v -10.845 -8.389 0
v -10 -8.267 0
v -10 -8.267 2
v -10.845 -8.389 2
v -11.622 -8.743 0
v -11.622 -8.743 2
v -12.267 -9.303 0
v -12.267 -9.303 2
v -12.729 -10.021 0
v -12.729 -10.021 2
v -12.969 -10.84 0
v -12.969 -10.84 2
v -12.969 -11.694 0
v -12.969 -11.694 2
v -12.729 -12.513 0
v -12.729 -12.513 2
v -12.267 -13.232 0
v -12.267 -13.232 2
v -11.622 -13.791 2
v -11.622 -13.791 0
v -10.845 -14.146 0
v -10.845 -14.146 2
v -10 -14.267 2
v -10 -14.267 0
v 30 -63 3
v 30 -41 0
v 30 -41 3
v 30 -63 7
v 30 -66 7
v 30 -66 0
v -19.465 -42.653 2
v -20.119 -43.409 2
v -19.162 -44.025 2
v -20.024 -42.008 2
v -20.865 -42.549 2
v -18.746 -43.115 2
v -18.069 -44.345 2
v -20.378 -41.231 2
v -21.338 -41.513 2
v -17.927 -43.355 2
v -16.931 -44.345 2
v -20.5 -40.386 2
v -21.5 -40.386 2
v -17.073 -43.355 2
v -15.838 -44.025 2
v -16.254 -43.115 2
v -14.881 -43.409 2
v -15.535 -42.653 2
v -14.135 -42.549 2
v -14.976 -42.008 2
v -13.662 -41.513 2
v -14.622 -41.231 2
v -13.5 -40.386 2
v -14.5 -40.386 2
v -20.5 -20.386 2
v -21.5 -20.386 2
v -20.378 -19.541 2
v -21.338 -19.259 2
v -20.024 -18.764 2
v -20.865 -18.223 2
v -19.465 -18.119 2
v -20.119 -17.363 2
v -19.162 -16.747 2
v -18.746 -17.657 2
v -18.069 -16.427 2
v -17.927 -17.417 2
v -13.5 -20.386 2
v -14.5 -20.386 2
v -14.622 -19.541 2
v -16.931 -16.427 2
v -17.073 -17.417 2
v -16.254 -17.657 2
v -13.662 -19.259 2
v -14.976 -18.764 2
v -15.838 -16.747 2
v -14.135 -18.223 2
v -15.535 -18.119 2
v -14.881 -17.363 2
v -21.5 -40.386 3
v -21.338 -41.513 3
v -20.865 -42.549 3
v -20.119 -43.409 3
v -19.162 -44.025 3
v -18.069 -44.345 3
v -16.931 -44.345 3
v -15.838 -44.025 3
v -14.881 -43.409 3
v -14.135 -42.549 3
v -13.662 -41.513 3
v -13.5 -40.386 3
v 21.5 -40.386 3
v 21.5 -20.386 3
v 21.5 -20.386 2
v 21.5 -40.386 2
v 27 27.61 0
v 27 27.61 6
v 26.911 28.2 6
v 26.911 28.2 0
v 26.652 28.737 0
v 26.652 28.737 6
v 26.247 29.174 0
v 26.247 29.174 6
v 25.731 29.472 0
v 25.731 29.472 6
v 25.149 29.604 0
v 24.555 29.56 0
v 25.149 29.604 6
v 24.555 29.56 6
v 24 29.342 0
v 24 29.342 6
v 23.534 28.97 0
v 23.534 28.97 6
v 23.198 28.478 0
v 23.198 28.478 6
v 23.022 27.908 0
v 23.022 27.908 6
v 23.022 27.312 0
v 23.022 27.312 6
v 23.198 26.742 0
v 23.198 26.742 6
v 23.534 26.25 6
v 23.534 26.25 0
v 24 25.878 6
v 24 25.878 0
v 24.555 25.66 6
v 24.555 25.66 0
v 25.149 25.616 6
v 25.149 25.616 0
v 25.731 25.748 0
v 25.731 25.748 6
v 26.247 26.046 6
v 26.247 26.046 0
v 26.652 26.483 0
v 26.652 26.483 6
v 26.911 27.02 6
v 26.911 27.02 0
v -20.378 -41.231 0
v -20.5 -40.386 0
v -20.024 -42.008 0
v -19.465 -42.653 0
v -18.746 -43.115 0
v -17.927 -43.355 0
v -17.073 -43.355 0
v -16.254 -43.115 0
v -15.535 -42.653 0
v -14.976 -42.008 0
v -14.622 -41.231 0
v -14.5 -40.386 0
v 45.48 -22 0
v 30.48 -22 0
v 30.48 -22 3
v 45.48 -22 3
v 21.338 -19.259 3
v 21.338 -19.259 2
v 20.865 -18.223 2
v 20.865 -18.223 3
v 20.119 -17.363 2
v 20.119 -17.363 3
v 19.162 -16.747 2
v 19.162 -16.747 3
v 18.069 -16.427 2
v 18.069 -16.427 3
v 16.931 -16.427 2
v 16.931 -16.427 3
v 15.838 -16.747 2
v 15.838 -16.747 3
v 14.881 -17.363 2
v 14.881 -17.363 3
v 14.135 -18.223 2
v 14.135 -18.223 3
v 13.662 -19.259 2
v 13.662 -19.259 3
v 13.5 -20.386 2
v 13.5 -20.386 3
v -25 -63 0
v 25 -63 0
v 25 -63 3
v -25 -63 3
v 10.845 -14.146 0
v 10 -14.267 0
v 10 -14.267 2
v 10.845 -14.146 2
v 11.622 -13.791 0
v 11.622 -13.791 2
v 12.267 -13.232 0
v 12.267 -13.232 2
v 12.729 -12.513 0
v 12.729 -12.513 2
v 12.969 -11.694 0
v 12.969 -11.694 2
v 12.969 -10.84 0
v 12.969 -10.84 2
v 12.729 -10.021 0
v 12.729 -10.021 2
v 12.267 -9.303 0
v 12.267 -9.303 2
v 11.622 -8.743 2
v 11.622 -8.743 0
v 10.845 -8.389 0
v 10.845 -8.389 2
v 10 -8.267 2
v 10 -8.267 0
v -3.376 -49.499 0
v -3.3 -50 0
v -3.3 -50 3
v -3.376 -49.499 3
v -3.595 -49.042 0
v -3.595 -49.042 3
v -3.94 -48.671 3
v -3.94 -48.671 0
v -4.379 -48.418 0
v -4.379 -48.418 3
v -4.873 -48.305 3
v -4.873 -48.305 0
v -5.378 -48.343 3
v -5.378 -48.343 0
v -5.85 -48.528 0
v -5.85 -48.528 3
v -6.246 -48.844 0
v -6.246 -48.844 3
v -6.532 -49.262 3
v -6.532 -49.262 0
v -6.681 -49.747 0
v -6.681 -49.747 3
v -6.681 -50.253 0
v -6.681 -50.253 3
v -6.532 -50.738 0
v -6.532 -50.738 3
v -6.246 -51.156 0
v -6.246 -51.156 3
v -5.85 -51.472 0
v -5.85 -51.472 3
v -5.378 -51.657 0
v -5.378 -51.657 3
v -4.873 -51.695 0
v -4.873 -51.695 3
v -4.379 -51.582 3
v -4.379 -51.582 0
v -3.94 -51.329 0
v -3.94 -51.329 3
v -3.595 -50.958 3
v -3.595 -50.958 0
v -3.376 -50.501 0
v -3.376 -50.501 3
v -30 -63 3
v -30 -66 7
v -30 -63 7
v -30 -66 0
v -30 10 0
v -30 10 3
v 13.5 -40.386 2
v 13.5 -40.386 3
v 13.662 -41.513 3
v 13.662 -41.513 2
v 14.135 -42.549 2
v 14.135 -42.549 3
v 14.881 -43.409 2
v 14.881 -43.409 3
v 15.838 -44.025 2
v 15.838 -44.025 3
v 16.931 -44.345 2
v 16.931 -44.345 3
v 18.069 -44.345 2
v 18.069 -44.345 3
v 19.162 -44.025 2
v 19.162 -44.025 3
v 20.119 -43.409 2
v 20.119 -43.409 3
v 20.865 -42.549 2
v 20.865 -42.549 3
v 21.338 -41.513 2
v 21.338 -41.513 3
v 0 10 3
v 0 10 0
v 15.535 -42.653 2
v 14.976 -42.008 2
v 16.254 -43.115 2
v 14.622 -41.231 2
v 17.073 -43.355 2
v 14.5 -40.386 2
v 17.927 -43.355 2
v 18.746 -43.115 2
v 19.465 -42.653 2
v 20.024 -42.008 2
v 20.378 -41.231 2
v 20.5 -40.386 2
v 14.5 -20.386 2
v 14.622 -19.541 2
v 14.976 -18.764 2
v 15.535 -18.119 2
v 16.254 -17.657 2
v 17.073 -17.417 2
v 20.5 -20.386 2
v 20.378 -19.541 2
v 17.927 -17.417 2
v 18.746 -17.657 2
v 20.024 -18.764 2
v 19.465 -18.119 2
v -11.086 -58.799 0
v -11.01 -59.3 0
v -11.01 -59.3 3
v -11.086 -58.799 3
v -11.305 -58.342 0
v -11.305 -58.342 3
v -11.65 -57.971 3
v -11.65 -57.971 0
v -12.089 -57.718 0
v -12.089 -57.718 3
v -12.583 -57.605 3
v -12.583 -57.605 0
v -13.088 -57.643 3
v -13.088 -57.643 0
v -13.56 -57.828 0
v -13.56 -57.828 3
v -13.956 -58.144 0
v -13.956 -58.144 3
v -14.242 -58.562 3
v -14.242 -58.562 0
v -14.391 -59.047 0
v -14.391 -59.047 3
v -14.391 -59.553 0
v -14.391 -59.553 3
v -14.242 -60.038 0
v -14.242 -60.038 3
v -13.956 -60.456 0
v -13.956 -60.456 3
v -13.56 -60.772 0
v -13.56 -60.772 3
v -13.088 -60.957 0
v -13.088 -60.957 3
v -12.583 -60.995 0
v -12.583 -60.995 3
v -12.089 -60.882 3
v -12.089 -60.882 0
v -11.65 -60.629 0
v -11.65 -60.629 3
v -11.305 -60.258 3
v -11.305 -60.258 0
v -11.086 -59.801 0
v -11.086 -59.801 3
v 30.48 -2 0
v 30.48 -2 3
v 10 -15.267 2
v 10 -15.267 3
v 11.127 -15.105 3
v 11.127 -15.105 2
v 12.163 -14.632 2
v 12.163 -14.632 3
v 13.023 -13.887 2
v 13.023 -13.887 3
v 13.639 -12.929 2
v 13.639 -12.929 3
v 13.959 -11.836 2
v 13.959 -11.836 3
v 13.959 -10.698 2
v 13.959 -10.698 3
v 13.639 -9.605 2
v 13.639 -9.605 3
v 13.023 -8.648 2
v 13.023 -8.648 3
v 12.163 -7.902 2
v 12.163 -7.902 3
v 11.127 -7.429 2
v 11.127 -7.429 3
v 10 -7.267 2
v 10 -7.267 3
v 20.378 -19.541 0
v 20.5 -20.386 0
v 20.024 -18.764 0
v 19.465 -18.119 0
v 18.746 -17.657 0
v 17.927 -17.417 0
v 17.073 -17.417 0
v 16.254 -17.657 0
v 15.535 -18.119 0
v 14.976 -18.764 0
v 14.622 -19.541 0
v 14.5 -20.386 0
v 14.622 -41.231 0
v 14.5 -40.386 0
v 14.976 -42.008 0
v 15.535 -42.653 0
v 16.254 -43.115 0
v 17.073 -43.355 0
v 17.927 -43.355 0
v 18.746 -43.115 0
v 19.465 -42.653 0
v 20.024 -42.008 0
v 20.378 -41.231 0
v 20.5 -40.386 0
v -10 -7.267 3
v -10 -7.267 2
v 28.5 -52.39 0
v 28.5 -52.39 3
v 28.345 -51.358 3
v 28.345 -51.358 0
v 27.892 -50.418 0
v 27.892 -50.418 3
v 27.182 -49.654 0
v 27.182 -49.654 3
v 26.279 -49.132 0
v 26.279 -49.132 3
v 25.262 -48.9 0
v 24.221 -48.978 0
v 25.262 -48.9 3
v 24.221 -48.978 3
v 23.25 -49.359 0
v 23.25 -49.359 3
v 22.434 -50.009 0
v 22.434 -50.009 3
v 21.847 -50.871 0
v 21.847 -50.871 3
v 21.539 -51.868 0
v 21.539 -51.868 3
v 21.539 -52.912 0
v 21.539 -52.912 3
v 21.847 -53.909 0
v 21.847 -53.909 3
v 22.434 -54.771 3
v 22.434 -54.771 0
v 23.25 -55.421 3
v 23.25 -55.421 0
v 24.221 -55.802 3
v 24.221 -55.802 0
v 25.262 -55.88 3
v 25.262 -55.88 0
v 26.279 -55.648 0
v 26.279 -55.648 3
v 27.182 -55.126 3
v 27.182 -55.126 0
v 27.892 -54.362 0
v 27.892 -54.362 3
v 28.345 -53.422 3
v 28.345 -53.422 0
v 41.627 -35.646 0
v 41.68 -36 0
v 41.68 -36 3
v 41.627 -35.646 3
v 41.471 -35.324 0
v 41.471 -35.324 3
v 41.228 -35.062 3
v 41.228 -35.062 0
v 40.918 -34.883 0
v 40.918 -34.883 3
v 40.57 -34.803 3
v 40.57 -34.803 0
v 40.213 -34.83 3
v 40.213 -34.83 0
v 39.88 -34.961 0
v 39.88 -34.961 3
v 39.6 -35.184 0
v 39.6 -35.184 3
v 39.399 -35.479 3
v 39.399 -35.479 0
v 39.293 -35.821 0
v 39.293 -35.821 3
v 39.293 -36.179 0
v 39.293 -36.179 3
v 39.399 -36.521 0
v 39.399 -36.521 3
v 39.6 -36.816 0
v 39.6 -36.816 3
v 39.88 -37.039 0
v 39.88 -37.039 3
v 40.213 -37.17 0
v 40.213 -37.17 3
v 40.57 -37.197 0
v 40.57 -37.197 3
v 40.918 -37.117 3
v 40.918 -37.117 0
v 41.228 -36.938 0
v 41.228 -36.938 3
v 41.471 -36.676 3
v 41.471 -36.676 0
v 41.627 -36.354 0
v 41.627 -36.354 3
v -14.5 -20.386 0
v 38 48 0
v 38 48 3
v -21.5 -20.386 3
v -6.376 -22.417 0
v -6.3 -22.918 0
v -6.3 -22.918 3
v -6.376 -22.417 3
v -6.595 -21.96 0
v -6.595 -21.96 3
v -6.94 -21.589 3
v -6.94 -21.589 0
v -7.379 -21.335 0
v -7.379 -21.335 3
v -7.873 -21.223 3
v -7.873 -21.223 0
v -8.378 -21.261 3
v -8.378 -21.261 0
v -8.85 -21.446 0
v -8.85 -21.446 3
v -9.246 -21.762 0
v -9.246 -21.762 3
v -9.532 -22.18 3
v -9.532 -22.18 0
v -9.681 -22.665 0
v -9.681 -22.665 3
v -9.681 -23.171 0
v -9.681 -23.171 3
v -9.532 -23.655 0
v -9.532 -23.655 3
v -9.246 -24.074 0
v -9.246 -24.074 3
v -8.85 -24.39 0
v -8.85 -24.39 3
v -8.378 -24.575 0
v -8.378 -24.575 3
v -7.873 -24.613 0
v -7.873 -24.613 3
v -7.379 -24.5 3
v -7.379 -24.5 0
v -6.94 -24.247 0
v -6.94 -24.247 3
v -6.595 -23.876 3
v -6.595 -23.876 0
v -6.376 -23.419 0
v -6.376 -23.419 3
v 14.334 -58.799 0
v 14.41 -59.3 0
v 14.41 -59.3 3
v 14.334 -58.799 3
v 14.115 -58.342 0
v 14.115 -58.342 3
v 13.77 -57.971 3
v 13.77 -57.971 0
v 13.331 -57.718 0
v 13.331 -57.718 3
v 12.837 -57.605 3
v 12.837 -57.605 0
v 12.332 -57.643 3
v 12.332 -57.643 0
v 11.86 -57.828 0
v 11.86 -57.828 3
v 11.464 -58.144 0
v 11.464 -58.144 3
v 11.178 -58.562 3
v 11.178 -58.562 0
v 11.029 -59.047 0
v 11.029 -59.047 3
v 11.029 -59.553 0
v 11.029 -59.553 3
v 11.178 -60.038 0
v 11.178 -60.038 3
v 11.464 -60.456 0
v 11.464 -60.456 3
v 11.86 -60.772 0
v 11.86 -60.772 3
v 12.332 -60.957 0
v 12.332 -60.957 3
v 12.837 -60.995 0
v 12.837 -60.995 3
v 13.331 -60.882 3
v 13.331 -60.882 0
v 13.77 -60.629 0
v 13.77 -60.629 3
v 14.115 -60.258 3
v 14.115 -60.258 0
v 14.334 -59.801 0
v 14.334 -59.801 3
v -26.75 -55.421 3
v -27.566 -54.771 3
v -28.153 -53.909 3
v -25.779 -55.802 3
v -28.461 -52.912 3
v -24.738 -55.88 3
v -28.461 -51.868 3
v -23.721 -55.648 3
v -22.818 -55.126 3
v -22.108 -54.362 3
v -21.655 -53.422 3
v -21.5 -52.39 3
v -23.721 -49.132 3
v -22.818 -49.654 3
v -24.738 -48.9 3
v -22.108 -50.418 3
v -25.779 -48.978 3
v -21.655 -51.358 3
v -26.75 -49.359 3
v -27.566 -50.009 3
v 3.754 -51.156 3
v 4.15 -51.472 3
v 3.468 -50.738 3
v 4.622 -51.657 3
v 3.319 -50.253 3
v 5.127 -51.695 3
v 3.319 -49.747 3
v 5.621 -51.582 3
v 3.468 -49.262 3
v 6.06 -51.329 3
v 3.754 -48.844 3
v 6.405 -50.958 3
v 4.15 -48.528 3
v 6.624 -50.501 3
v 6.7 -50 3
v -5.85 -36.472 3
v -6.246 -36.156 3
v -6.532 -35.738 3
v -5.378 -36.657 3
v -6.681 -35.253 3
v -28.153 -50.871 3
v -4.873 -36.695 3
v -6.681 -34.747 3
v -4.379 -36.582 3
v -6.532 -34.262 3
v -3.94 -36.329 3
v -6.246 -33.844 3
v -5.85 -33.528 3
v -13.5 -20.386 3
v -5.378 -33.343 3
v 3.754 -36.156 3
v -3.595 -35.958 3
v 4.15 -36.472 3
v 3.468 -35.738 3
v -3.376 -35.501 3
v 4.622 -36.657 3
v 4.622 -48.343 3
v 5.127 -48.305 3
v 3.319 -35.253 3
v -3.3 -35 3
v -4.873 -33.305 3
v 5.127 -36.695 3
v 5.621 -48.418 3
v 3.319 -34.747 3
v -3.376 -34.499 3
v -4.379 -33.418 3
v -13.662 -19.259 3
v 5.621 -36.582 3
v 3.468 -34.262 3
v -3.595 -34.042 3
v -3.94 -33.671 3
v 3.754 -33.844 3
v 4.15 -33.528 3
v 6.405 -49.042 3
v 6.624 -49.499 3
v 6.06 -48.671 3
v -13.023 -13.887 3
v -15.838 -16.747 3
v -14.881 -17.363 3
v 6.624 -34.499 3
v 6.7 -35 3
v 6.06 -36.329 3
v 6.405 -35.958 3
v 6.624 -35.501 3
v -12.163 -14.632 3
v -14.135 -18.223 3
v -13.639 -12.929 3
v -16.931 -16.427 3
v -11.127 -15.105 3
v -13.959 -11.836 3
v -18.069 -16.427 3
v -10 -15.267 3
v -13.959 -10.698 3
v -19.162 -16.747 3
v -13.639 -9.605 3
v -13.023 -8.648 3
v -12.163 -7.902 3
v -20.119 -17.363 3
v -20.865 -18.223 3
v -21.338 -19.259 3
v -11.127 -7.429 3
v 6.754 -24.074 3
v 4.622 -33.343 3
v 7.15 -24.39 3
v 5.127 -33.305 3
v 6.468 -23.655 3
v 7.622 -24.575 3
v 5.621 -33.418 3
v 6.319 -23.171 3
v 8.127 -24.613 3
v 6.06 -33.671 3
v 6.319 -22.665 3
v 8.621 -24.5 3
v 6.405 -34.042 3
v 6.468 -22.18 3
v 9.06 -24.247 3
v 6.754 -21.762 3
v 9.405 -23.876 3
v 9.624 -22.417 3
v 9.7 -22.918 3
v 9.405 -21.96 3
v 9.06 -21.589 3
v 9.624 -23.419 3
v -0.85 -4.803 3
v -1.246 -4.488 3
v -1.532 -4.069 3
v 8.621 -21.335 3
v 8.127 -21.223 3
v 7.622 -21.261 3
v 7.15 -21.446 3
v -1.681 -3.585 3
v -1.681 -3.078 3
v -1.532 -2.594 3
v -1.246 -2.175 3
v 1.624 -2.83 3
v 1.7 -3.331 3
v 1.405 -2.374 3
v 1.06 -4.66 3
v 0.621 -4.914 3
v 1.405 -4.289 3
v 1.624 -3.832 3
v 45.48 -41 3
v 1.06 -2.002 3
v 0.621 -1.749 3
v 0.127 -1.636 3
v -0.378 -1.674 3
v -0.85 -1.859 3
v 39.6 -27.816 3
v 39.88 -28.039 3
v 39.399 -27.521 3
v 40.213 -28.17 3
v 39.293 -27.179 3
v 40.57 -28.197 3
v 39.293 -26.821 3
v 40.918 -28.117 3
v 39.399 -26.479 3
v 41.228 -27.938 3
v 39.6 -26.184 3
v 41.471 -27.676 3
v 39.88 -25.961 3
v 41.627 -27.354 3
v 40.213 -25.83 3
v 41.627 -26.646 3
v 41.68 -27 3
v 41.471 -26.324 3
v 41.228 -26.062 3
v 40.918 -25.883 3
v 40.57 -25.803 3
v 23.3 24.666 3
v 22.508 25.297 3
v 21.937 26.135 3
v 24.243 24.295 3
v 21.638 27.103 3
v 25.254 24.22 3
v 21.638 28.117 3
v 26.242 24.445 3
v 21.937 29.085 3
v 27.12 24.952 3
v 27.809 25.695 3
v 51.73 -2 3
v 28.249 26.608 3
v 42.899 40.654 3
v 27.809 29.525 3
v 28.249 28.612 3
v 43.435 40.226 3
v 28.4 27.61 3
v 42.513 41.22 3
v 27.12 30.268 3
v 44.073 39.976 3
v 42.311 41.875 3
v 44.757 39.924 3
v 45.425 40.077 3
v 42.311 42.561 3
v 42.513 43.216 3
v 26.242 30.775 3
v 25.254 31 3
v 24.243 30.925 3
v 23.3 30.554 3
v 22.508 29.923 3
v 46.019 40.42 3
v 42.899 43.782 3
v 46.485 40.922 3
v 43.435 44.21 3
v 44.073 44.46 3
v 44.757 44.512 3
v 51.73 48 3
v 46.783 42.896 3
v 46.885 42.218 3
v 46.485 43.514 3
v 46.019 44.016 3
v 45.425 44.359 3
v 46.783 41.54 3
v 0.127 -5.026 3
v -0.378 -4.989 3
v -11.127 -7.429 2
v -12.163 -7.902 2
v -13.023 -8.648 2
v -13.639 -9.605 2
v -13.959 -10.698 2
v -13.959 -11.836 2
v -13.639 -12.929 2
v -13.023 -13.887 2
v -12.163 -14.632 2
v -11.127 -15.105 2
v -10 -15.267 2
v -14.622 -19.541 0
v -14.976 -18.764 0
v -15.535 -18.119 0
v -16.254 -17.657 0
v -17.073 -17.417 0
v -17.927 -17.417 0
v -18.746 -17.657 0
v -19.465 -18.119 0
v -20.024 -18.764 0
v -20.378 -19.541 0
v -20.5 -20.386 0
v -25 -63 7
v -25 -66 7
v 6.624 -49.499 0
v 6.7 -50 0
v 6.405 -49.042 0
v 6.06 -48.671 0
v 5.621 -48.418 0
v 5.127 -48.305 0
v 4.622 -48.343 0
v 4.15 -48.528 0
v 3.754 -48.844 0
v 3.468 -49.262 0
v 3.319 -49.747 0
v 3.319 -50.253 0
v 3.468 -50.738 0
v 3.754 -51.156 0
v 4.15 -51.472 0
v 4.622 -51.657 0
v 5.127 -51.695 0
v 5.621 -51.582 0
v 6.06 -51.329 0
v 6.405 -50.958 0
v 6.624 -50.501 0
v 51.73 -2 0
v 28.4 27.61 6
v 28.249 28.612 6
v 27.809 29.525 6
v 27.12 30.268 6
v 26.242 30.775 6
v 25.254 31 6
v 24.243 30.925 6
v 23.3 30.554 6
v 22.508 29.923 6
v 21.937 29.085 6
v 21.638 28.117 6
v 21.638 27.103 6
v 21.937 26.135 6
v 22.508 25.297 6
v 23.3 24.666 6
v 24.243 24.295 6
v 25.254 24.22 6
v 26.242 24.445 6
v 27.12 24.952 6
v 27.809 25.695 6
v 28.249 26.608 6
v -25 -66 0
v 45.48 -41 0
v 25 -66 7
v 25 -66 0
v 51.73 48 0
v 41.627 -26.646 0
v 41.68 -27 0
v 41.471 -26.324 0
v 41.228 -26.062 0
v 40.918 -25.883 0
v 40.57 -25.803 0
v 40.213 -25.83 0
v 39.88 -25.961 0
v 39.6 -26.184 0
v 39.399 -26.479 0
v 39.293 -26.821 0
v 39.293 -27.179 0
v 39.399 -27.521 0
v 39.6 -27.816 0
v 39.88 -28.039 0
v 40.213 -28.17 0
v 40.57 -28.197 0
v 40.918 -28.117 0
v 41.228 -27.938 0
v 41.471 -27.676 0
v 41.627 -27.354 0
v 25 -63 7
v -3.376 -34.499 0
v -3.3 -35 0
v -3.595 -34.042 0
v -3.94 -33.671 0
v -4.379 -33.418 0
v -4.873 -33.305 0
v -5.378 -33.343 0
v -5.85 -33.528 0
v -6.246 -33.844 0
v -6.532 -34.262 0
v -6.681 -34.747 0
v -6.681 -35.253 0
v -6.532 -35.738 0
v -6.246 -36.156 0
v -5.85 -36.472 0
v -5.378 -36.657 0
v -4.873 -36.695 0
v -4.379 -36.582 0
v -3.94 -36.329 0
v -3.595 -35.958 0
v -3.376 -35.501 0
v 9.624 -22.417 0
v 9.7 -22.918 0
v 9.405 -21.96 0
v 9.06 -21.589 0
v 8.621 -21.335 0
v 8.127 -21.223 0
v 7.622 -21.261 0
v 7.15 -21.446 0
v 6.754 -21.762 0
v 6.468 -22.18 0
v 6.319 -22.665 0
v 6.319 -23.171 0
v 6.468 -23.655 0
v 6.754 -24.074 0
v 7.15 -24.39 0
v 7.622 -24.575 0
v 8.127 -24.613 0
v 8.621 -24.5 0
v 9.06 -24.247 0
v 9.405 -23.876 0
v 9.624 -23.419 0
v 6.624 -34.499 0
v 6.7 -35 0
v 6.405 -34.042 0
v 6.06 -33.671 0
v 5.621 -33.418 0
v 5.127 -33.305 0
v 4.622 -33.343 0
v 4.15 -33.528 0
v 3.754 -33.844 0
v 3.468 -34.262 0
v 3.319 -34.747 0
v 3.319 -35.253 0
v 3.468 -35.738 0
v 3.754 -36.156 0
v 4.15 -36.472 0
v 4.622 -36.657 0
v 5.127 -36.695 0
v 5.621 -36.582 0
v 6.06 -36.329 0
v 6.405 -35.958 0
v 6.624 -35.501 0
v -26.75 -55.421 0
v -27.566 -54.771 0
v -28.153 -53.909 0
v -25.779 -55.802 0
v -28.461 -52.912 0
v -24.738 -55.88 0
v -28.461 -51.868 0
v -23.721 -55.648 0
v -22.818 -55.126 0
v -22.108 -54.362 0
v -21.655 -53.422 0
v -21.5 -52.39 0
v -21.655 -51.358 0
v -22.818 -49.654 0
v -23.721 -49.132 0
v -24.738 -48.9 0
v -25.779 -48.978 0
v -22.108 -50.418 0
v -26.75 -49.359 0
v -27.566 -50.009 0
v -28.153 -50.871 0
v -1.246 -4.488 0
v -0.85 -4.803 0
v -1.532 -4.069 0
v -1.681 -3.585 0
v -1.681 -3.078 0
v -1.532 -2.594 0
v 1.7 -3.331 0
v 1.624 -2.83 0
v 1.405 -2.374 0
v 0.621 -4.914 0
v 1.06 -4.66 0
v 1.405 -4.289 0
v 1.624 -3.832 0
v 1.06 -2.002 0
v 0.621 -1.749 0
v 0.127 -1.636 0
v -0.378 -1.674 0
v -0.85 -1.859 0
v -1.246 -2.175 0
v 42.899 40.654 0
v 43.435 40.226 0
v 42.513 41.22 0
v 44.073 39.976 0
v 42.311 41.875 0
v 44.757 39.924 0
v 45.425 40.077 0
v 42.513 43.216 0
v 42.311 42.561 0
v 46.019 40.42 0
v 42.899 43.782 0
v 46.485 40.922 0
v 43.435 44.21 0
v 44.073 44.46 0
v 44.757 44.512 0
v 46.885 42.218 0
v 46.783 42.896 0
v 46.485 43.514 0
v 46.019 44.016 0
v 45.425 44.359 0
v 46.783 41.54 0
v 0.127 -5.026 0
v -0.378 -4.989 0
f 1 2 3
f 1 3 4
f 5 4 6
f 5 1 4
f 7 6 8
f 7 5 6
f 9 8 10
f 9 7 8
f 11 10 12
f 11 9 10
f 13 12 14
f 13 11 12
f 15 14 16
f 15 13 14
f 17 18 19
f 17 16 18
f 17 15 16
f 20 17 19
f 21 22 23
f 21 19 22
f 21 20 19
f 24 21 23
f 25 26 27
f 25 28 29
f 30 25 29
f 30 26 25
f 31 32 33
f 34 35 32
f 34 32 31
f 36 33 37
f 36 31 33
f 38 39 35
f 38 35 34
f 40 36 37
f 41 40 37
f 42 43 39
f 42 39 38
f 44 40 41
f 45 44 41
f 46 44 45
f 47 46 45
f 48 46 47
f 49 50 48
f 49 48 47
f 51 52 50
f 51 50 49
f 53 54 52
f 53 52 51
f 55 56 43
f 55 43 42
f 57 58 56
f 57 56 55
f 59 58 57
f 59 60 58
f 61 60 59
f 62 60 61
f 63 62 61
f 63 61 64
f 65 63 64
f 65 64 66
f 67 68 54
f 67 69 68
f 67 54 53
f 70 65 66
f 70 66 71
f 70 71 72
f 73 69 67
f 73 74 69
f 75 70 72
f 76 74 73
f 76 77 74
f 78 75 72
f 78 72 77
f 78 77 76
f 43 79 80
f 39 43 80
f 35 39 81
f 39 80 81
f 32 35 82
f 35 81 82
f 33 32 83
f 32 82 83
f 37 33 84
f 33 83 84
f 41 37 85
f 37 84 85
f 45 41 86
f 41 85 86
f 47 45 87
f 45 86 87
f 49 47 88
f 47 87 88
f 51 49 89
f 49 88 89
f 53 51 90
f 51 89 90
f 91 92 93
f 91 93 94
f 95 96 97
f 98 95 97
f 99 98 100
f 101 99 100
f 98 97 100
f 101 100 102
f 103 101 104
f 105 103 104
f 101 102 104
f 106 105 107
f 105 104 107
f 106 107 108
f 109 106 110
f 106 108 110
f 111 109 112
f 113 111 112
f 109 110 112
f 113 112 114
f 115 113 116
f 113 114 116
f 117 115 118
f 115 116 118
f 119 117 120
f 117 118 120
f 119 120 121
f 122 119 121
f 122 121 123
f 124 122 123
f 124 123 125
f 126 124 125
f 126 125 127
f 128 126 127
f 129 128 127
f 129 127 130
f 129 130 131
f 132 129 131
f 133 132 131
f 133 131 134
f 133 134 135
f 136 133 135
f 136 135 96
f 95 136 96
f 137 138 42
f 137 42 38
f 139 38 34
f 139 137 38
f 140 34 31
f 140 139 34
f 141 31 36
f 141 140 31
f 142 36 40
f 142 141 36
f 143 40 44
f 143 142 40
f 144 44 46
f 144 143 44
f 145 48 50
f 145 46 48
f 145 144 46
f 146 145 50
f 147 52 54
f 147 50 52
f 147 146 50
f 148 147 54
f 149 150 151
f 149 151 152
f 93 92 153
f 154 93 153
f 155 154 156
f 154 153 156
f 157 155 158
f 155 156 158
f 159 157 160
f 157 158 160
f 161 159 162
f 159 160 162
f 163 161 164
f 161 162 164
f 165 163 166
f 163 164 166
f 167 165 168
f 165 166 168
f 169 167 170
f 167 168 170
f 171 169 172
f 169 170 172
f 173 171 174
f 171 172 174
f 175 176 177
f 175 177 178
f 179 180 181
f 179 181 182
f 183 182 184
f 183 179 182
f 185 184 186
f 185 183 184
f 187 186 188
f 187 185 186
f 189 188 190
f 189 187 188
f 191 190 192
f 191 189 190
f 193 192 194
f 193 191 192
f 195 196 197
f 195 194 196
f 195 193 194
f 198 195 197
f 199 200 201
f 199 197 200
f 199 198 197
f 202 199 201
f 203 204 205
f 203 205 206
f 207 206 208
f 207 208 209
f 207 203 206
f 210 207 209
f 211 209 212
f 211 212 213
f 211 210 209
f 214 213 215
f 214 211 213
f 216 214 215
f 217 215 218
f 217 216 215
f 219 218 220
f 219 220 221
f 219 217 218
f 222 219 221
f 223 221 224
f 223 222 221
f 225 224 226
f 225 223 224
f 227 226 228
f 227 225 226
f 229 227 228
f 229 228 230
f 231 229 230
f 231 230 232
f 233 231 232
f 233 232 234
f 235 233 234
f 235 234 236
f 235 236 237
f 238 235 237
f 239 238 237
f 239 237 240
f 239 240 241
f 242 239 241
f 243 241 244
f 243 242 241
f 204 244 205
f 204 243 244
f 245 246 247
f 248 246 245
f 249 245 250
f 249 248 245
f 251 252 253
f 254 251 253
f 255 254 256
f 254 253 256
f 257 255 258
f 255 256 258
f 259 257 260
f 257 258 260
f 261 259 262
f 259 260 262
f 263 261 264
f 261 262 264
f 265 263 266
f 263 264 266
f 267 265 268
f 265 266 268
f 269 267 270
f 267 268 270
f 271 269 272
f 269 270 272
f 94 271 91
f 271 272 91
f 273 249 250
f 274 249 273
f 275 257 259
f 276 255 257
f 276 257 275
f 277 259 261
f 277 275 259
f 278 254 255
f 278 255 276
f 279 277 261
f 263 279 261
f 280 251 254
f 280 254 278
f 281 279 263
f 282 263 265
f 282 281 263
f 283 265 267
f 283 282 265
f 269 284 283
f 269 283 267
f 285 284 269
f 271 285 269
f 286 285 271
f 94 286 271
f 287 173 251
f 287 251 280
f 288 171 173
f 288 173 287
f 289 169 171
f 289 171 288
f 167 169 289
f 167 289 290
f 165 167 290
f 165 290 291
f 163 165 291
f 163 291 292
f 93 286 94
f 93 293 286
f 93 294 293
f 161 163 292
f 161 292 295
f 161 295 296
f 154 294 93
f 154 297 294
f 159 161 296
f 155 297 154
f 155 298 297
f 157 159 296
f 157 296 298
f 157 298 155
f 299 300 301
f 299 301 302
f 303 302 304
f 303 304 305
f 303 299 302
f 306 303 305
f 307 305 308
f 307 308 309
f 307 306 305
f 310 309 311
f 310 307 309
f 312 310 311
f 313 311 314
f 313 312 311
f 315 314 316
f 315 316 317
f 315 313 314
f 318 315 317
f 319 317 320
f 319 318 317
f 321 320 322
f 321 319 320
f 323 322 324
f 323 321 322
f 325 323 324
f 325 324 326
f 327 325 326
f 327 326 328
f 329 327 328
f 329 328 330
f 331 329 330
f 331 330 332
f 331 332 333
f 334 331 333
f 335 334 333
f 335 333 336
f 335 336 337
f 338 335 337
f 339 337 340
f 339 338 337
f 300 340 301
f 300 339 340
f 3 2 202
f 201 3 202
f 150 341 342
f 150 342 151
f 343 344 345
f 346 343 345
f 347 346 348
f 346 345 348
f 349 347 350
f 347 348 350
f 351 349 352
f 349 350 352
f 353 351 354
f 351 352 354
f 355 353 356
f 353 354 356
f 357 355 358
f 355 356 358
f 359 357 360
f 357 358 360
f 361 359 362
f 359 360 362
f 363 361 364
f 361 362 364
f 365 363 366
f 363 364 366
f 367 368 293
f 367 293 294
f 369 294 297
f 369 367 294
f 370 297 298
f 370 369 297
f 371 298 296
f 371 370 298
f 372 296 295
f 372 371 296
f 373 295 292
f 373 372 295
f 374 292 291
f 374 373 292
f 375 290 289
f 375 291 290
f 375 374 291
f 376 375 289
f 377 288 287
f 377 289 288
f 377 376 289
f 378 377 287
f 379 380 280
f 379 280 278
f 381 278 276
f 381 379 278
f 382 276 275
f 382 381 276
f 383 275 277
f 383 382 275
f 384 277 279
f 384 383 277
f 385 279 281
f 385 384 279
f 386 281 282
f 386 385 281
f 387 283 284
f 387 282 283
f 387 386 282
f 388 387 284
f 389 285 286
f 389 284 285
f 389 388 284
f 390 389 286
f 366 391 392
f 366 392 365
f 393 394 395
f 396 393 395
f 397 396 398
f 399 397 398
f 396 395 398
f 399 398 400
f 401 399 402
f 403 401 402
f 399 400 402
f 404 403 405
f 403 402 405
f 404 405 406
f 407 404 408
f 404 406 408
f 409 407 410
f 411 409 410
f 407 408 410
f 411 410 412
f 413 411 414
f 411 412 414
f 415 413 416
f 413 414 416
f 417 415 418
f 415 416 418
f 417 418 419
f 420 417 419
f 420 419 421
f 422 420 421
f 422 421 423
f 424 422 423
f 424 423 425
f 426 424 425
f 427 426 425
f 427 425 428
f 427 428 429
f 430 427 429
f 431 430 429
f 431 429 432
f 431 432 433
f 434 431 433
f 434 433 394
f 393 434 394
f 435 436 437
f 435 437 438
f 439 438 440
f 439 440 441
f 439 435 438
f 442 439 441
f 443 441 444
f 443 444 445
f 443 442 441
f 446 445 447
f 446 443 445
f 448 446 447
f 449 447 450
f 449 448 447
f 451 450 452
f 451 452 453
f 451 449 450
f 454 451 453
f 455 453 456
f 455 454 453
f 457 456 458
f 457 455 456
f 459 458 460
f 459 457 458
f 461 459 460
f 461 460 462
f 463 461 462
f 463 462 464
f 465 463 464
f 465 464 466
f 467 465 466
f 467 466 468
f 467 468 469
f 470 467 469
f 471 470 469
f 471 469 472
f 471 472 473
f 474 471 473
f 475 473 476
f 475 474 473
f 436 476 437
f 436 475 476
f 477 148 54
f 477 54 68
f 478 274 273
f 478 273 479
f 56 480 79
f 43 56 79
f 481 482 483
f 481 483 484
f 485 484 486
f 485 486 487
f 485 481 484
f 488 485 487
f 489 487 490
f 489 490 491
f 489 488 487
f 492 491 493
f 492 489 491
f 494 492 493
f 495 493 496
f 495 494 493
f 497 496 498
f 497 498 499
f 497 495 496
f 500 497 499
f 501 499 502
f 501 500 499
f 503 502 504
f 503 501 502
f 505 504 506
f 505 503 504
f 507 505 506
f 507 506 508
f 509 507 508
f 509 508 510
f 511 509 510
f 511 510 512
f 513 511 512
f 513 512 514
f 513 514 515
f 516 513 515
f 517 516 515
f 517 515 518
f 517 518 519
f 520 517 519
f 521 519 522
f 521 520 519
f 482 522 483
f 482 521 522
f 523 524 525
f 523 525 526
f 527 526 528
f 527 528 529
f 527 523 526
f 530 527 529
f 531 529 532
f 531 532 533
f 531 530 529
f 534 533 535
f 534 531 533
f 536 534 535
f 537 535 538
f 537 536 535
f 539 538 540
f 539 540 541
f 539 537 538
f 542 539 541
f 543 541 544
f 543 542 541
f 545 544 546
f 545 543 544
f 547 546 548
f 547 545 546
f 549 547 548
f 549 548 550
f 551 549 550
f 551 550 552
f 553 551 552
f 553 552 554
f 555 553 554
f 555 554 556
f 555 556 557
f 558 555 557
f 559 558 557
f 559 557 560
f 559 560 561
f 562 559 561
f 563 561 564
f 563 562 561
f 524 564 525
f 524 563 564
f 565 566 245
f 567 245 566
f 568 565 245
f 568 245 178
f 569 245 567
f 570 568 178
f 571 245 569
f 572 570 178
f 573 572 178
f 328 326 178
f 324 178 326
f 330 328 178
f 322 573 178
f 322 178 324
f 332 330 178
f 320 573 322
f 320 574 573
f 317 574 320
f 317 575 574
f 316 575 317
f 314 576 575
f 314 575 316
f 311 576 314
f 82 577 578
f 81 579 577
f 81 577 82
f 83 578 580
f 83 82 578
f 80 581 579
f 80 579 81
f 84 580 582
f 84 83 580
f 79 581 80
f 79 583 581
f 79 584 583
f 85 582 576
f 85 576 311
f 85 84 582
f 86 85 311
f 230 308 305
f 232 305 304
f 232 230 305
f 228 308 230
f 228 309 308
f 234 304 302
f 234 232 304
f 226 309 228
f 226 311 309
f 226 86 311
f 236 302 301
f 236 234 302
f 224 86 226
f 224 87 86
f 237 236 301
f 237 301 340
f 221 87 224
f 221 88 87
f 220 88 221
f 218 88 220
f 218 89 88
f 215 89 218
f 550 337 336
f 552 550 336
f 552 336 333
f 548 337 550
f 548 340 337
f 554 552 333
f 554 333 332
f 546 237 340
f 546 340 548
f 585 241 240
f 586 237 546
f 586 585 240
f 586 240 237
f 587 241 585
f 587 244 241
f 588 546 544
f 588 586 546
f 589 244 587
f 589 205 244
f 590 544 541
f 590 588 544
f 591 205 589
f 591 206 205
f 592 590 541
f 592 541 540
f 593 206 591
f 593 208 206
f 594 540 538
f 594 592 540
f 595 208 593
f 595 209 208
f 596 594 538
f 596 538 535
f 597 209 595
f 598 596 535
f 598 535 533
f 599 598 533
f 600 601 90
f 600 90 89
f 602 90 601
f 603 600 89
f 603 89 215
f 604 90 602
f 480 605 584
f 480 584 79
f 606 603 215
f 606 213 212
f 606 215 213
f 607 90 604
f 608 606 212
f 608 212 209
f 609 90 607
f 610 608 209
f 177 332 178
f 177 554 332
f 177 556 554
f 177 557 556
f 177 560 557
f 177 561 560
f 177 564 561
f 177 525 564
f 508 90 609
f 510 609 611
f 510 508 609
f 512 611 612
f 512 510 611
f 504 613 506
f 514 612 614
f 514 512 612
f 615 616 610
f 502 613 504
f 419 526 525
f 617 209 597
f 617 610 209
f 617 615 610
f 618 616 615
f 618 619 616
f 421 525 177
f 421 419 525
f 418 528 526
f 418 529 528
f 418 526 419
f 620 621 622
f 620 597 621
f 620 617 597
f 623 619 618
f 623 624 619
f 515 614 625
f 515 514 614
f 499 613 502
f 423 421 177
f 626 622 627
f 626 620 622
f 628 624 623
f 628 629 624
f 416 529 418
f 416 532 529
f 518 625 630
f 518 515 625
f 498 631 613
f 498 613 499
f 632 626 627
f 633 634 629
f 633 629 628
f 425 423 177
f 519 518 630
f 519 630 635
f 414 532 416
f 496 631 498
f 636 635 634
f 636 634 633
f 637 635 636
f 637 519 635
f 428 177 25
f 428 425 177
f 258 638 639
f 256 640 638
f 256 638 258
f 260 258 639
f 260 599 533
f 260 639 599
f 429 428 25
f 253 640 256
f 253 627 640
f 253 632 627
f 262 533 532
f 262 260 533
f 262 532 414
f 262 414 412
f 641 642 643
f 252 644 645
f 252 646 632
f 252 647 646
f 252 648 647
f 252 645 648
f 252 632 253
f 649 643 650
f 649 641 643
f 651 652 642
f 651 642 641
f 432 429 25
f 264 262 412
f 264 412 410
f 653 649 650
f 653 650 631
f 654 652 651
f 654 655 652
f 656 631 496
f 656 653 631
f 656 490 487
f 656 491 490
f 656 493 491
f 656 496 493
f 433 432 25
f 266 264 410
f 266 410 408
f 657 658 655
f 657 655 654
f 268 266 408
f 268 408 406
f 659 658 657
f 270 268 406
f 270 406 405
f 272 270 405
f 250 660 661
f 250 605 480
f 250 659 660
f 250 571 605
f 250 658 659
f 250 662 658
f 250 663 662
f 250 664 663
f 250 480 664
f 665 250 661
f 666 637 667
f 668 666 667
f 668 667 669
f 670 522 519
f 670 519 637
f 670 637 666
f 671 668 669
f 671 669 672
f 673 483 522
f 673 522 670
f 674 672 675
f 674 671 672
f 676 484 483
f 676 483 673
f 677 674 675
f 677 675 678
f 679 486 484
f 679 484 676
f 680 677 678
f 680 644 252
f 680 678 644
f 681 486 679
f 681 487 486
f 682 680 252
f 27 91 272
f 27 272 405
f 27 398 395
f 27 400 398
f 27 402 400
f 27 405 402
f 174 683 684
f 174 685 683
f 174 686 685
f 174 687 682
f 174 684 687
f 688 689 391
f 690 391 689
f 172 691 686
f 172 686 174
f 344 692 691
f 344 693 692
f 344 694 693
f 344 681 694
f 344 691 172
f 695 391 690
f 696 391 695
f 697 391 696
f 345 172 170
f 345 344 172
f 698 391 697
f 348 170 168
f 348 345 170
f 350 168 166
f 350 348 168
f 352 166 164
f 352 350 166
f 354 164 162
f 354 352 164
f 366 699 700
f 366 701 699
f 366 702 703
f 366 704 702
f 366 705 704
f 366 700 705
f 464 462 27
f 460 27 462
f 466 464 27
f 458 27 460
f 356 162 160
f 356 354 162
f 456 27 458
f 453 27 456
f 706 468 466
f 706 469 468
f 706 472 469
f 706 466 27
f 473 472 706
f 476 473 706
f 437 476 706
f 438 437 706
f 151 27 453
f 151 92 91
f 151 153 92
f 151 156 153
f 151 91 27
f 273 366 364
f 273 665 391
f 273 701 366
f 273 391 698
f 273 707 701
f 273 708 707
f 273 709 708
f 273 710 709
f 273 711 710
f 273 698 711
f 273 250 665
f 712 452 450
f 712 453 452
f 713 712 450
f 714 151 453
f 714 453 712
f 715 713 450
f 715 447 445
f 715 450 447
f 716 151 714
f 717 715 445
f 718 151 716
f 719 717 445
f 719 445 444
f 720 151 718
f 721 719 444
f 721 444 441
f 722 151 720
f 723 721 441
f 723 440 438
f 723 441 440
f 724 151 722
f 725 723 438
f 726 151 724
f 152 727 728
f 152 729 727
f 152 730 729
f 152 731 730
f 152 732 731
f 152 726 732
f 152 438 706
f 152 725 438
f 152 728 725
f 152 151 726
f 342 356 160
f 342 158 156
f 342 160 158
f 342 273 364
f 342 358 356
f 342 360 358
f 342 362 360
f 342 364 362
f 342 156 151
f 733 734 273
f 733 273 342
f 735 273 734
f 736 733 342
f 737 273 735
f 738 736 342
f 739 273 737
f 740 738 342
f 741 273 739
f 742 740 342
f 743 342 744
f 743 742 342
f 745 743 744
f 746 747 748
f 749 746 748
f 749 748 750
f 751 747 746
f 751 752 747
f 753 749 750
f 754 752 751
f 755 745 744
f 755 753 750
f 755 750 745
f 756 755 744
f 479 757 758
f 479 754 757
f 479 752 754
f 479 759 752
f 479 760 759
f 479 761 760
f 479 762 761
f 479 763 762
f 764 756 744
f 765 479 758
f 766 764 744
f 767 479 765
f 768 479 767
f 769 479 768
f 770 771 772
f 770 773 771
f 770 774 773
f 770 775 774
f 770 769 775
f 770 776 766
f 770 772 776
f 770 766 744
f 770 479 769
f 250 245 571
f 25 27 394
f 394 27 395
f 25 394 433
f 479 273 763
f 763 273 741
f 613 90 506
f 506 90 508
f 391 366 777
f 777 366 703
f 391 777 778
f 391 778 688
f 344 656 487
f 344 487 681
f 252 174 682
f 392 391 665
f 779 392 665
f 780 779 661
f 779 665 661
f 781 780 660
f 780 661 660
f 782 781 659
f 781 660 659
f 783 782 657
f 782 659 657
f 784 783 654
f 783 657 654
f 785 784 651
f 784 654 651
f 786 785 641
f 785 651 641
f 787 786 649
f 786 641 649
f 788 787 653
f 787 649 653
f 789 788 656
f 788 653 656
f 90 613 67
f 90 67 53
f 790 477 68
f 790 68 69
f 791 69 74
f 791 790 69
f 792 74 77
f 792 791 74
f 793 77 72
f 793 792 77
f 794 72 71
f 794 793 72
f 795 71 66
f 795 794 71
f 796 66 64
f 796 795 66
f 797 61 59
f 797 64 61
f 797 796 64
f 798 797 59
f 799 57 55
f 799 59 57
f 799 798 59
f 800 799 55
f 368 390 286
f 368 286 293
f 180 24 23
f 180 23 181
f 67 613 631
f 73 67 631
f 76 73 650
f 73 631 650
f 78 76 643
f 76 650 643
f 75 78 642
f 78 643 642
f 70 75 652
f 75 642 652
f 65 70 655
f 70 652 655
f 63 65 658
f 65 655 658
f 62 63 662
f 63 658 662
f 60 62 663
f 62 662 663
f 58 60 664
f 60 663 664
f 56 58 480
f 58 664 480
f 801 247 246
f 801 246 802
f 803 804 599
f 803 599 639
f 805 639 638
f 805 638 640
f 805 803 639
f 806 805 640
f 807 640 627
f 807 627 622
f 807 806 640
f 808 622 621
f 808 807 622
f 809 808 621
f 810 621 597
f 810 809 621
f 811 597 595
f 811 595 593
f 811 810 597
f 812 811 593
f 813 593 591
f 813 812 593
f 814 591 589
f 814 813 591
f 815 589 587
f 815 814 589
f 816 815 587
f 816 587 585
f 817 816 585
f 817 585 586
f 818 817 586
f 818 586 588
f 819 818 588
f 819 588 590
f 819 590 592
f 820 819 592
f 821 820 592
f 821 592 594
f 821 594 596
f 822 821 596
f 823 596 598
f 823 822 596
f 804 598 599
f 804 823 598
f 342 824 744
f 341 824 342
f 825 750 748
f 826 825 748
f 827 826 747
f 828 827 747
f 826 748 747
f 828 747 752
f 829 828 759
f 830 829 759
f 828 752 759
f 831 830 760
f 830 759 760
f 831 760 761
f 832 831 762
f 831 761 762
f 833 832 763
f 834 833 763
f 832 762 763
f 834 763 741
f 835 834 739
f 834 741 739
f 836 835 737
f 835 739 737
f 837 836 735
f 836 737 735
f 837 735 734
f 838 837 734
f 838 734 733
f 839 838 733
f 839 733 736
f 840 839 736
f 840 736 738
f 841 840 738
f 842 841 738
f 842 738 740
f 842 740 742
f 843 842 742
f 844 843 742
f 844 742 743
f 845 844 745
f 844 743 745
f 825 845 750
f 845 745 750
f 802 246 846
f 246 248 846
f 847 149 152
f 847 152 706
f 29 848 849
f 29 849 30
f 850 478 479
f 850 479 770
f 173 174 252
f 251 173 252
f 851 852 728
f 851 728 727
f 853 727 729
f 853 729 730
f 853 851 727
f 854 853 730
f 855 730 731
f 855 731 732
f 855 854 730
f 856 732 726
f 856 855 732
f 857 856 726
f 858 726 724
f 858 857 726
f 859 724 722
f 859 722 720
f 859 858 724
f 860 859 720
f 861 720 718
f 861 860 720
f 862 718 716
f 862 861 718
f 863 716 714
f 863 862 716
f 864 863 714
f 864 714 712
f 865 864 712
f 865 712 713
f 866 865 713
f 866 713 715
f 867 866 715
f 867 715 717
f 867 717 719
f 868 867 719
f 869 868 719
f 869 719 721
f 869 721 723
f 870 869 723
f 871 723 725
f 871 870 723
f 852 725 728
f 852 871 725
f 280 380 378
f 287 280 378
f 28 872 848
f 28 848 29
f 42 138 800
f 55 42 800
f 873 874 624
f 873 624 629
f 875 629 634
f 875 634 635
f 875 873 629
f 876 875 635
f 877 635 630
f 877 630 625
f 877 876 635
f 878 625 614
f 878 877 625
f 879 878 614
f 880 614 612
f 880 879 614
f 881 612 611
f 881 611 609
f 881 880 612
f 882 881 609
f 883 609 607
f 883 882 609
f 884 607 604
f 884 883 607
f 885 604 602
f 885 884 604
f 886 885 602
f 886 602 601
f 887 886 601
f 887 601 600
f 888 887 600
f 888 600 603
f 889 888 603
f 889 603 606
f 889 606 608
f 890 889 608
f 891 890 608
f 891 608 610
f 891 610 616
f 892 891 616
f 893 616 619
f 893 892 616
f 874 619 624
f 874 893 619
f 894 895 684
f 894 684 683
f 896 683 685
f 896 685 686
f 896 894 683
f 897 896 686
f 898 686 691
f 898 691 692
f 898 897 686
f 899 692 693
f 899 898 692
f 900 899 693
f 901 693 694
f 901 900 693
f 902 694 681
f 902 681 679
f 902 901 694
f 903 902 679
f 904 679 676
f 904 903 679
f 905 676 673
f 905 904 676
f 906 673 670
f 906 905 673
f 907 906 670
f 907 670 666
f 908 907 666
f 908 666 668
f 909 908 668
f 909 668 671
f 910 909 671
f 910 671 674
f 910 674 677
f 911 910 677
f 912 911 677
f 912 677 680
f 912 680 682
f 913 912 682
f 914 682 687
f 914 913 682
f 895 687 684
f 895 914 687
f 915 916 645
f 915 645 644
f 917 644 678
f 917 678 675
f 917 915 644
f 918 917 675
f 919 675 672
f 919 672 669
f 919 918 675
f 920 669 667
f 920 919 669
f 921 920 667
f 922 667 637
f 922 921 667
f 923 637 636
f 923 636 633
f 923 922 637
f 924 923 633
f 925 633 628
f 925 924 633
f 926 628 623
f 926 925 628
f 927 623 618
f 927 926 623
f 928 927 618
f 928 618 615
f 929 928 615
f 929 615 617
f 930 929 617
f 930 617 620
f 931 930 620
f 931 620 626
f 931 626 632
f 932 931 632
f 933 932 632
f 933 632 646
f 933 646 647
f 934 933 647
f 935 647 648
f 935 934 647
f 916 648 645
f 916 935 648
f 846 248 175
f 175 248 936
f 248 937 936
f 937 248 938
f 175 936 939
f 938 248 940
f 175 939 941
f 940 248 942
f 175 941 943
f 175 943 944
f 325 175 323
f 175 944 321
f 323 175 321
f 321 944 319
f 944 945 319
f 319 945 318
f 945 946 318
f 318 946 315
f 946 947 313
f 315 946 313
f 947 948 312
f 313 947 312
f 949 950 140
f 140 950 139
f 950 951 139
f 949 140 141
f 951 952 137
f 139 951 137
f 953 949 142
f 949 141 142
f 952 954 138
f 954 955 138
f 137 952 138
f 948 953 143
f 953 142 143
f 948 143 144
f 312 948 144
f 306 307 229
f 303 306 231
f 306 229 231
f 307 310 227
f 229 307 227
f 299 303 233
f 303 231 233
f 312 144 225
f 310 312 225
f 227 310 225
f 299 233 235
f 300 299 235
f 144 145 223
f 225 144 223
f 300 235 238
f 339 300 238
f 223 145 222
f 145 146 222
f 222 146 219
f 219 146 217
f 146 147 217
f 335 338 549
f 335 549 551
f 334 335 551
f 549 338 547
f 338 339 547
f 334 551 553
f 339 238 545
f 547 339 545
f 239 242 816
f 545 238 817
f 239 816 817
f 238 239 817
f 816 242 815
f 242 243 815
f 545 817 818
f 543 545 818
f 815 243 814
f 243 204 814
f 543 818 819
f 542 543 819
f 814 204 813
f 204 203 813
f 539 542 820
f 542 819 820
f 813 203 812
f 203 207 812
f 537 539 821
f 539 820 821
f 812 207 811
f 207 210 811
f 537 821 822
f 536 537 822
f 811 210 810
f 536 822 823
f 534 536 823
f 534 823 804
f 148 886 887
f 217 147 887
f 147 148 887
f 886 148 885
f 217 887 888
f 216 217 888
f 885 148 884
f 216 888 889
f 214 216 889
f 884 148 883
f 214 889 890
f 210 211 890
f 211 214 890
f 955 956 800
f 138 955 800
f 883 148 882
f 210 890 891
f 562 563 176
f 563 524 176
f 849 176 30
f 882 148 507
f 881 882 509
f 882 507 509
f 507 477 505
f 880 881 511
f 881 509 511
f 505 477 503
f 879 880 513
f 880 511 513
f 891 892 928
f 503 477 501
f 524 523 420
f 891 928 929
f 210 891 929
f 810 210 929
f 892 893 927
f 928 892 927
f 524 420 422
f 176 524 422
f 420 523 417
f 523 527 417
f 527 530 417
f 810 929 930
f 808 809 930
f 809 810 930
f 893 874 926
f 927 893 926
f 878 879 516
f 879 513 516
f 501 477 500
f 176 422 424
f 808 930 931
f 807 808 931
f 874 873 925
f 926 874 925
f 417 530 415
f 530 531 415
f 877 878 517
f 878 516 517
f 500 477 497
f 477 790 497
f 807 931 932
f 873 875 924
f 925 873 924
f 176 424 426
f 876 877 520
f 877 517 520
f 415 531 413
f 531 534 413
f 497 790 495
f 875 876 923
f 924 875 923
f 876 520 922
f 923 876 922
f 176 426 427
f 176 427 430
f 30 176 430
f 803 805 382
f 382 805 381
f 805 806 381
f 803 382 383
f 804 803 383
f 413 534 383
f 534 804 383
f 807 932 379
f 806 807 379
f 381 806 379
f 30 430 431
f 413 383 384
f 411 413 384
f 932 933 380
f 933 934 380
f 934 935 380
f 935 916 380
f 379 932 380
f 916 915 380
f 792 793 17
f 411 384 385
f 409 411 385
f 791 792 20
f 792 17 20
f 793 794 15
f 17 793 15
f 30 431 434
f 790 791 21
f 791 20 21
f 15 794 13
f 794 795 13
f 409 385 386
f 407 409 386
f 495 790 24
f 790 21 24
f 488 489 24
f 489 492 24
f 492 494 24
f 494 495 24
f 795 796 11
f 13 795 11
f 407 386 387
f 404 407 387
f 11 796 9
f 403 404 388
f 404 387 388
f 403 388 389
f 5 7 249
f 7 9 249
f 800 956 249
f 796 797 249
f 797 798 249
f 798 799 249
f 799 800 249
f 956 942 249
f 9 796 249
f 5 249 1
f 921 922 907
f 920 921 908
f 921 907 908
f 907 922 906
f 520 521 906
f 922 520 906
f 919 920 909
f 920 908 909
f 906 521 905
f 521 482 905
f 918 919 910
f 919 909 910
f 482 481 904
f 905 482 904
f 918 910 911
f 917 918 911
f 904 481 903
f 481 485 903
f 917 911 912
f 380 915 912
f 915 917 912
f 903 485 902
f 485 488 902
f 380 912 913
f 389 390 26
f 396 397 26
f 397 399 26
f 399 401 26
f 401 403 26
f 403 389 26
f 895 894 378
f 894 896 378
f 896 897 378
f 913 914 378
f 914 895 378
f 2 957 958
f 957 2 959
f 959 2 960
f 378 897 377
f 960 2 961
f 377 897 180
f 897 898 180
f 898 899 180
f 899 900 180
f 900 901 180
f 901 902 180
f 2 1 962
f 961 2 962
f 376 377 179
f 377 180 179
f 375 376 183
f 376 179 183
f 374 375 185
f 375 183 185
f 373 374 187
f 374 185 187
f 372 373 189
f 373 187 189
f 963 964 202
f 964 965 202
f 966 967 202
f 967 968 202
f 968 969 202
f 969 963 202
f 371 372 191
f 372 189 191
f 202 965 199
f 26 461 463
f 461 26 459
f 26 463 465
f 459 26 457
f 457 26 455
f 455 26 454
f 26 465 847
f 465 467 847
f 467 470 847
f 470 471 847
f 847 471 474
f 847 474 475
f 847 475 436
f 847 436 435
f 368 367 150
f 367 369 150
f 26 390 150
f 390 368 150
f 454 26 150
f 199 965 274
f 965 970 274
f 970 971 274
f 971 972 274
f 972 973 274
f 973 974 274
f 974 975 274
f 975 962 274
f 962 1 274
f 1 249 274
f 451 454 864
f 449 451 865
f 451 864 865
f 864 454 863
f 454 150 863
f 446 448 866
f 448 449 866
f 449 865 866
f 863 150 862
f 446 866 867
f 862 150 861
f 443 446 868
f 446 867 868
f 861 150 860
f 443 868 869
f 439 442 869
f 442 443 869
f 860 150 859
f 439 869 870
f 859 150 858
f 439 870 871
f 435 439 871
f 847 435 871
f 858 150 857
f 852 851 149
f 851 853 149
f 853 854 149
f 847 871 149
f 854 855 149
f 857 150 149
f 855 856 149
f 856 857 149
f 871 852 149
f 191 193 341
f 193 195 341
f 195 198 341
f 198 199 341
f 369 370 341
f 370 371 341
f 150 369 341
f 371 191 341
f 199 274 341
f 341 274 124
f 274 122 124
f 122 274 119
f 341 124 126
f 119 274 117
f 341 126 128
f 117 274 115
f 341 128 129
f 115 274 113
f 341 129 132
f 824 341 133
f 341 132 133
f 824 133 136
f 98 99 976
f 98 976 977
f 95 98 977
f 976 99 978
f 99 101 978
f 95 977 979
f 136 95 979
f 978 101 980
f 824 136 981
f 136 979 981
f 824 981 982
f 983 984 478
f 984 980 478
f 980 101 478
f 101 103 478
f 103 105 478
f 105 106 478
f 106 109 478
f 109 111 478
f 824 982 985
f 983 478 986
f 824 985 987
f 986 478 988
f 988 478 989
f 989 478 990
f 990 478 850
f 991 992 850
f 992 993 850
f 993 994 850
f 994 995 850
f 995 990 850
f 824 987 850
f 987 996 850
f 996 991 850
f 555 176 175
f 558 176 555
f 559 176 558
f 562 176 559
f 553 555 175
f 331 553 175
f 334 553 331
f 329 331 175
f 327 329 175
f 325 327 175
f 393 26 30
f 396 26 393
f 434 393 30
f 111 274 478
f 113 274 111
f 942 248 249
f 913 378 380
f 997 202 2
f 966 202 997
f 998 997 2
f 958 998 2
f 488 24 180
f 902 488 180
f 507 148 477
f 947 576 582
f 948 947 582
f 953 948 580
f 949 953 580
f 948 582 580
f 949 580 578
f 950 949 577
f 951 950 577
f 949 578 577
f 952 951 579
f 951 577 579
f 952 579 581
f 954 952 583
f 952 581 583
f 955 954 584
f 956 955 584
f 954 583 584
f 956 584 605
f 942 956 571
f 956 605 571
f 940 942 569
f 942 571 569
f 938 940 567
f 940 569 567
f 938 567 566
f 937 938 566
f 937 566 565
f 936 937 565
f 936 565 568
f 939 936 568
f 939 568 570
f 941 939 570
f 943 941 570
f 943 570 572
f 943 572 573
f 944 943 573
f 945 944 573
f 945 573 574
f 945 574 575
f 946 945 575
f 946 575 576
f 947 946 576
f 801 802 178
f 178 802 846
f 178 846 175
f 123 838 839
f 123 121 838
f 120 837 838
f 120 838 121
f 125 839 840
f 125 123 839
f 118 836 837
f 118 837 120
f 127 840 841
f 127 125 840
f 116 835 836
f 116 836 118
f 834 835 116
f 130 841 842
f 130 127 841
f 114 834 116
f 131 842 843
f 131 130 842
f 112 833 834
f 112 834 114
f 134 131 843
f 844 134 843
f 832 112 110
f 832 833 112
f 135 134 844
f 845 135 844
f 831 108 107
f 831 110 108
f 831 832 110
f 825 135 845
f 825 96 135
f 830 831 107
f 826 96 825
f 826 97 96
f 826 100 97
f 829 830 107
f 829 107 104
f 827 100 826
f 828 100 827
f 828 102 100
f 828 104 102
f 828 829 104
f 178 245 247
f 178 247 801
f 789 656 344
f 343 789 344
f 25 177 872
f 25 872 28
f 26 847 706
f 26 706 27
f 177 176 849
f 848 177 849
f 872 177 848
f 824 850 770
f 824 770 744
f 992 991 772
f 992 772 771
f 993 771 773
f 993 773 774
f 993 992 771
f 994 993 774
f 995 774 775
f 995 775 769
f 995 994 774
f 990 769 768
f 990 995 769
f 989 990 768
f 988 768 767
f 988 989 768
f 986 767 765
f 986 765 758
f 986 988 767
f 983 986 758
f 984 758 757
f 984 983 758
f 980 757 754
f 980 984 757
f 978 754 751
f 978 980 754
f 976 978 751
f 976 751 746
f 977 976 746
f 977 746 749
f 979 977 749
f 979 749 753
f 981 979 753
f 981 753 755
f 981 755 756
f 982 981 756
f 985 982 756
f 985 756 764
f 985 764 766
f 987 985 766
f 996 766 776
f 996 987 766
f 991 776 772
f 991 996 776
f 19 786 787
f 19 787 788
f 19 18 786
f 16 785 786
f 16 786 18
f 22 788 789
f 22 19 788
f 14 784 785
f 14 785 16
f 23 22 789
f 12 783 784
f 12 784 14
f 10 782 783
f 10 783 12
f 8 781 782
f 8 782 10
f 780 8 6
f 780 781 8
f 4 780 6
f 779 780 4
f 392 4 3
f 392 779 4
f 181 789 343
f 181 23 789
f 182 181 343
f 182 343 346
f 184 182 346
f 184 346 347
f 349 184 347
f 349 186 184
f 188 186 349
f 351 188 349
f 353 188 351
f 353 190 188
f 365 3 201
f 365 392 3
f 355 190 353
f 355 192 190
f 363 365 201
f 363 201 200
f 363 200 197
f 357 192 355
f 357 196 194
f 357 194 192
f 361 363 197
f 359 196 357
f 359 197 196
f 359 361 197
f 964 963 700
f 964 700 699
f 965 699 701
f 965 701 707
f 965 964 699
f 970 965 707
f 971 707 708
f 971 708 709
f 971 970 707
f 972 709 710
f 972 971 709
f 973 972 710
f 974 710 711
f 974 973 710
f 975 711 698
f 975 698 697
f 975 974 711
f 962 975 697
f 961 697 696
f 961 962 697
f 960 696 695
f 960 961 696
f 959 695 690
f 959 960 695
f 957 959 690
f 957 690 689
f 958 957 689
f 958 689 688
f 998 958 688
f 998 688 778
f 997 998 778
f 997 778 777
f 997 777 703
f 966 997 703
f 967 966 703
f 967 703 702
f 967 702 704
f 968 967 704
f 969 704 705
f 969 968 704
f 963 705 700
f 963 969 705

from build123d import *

# Parameters (mm, degrees)
SKETCH_R        = 2.3
SKETCH_R_2      = 1.7
SKETCH_R_3      = 1.2
PAD_DEPTH       = 3
SKETCH004_R     = 2.345013
SKETCH004_R_2   = 1.7
POCKET004_DEPTH = 5
SKETCH003_R     = 3.5
SKETCH003_R_2   = 2
POCKET005_DEPTH = 5
SKETCH005_R     = 3.4
PAD001_DEPTH    = 3
SKETCH006_R     = 2
POCKET_DEPTH    = 8
SKETCH009_R     = 2
POCKET007_DEPTH = 3
POCKET008_DEPTH = 1
SKETCH011_W     = 5
SKETCH011_H     = 3
PAD003_DEPTH    = 3
SKETCH012_W     = 5
SKETCH012_H     = 3
PAD004_DEPTH    = 4


with BuildPart() as part:
    # Sketch → Pad (new body)
    with BuildSketch(Plane.XY):
        Polygon((30, -63), (-30, -63), (-30, 10), (0, 10), (38, 48), (51.73, 48), (51.73, -2), (30.48, -2), (30.48, -22), (45.48, -22), (45.48, -41), (30, -41), align=None)
        with Locations((44.585025, 42.218019)):
            Circle(SKETCH_R, mode=Mode.SUBTRACT)
        with Locations((-12.71, -59.3)):
            Circle(SKETCH_R_2, mode=Mode.SUBTRACT)
        with Locations((12.71, -59.3)):
            Circle(SKETCH_R_2, mode=Mode.SUBTRACT)
        with Locations((0, -3.331213)):
            Circle(SKETCH_R_2, mode=Mode.SUBTRACT)
        with Locations((-8, -22.917882)):
            Circle(SKETCH_R_2, mode=Mode.SUBTRACT)
        with Locations((8, -22.917882)):
            Circle(SKETCH_R_2, mode=Mode.SUBTRACT)
        with Locations((40.48, -27)):
            Circle(SKETCH_R_3, mode=Mode.SUBTRACT)
        with Locations((40.48, -36)):
            Circle(SKETCH_R_3, mode=Mode.SUBTRACT)
        with Locations((-5, -35)):
            Circle(SKETCH_R_2, mode=Mode.SUBTRACT)
        with Locations((5, -35)):
            Circle(SKETCH_R_2, mode=Mode.SUBTRACT)
        with Locations((-5, -50)):
            Circle(SKETCH_R_2, mode=Mode.SUBTRACT)
        with Locations((5, -50)):
            Circle(SKETCH_R_2, mode=Mode.SUBTRACT)
        with BuildLine():
            ThreePointArc((-20.5, -40.385975), (-17.5, -43.385975), (-14.5, -40.385975))
            Line((-14.5, -40.385975), (-14.5, -20.385975))
            ThreePointArc((-14.5, -20.385975), (-17.5, -17.385975), (-20.5, -20.385975))
            Line((-20.5, -40.385975), (-20.5, -20.385975))
        make_face(mode=Mode.SUBTRACT)
        with BuildLine():
            ThreePointArc((14.5, -40.385975), (17.5, -43.385975), (20.5, -40.385975))
            Line((20.5, -40.385975), (20.5, -20.385975))
            ThreePointArc((20.5, -20.385975), (17.5, -17.385975), (14.5, -20.385975))
            Line((14.5, -40.385975), (14.5, -20.385975))
        make_face(mode=Mode.SUBTRACT)
        with BuildLine():
            ThreePointArc((-10, -8.267137), (-13, -11.267137), (-10, -14.267137))
            Line((-10, -14.267137), (10, -14.267137))
            ThreePointArc((10, -14.267137), (13, -11.267137), (10, -8.267137))
            Line((-10, -8.267137), (10, -8.267137))
        make_face(mode=Mode.SUBTRACT)
    extrude(amount=PAD_DEPTH)

    # Sketch004 → Pocket004 (cut)
    with BuildSketch(Plane.XY):
        with Locations((-5, -35)):
            Circle(SKETCH004_R)
        with Locations((-5, -35)):
            Circle(SKETCH004_R_2, mode=Mode.SUBTRACT)
        with Locations((5, -35)):
            Circle(SKETCH004_R_2)
        with Locations((5, -50)):
            Circle(SKETCH004_R_2)
        with Locations((-5, -50)):
            Circle(SKETCH004_R_2)
    extrude(amount=-POCKET004_DEPTH, mode=Mode.SUBTRACT)

    # Sketch003 → Pocket005 (cut)
    with BuildSketch(Plane.XY.offset(3)):
        with Locations((-25, -52.39)):
            Circle(SKETCH003_R)
        with Locations((25, -52.39)):
            Circle(SKETCH003_R)
        with Locations((25, 27.61)):
            Circle(SKETCH003_R_2)
    extrude(amount=-POCKET005_DEPTH, mode=Mode.SUBTRACT)

    # Sketch005 (on Face5 of Pocket005) → Pad001 (join)
    with BuildSketch(Plane.XY.offset(3)):
        with Locations((25, 27.61)):
            Circle(SKETCH005_R)
    extrude(amount=PAD001_DEPTH)

    # Sketch006 (on Face45 of Pad001) → Pocket (cut)
    with BuildSketch(Plane.XY.offset(6)):
        with Locations((25, 27.61)):
            Circle(SKETCH006_R)
    extrude(amount=-POCKET_DEPTH, mode=Mode.SUBTRACT)

    # Sketch009 → Pocket007 (cut)
    with BuildSketch(Plane.XY.offset(4.5)):
        with Locations((25, 27.61)):
            Circle(SKETCH009_R)
    extrude(amount=-POCKET007_DEPTH, mode=Mode.SUBTRACT)

    # Sketch010 (on Face5 of Pocket007) → Pocket008 (cut)
    with BuildSketch(Plane.XY.offset(3)):
        with BuildLine():
            ThreePointArc((-13.5, -20.385975), (-17.5, -16.385975), (-21.5, -20.385975))
            Line((-21.5, -20.385975), (-21.5, -40.385975))
            ThreePointArc((-21.5, -40.385975), (-17.5, -44.385975), (-13.5, -40.385975))
            Line((-13.5, -20.385975), (-13.5, -40.385975))
        make_face()
        with BuildLine():
            ThreePointArc((-10, -7.267137), (-14, -11.267137), (-10, -15.267137))
            Line((-10, -15.267137), (10, -15.267137))
            ThreePointArc((10, -15.267137), (14, -11.267137), (10, -7.267137))
            Line((-10, -7.267137), (10, -7.267137))
        make_face()
        with BuildLine():
            ThreePointArc((21.5, -20.385975), (17.5, -16.385975), (13.5, -20.385975))
            Line((13.5, -20.385975), (13.5, -40.385975))
            ThreePointArc((13.5, -40.385975), (17.5, -44.385975), (21.5, -40.385975))
            Line((21.5, -20.385975), (21.5, -40.385975))
        make_face()
    extrude(amount=-POCKET008_DEPTH, mode=Mode.SUBTRACT)

    # Sketch011 (on Face13 of Pocket008) → Pad003 (join)
    with BuildSketch(Plane.XZ.offset(63)):
        with Locations((-27.5, 1.5)):
            Rectangle(SKETCH011_W, SKETCH011_H)
        with Locations((27.5, 1.5)):
            Rectangle(SKETCH011_W, SKETCH011_H)
    extrude(amount=PAD003_DEPTH)

    # Sketch012 (on Face45 of Pad003) → Pad004 (join)
    with BuildSketch(Plane.XY.offset(3)):
        with Locations((-27.5, -64.5)):
            Rectangle(SKETCH012_W, SKETCH012_H)
        with Locations((27.5, -64.5)):
            Rectangle(SKETCH012_W, SKETCH012_H)
    extrude(amount=PAD004_DEPTH)


solid = part.part
